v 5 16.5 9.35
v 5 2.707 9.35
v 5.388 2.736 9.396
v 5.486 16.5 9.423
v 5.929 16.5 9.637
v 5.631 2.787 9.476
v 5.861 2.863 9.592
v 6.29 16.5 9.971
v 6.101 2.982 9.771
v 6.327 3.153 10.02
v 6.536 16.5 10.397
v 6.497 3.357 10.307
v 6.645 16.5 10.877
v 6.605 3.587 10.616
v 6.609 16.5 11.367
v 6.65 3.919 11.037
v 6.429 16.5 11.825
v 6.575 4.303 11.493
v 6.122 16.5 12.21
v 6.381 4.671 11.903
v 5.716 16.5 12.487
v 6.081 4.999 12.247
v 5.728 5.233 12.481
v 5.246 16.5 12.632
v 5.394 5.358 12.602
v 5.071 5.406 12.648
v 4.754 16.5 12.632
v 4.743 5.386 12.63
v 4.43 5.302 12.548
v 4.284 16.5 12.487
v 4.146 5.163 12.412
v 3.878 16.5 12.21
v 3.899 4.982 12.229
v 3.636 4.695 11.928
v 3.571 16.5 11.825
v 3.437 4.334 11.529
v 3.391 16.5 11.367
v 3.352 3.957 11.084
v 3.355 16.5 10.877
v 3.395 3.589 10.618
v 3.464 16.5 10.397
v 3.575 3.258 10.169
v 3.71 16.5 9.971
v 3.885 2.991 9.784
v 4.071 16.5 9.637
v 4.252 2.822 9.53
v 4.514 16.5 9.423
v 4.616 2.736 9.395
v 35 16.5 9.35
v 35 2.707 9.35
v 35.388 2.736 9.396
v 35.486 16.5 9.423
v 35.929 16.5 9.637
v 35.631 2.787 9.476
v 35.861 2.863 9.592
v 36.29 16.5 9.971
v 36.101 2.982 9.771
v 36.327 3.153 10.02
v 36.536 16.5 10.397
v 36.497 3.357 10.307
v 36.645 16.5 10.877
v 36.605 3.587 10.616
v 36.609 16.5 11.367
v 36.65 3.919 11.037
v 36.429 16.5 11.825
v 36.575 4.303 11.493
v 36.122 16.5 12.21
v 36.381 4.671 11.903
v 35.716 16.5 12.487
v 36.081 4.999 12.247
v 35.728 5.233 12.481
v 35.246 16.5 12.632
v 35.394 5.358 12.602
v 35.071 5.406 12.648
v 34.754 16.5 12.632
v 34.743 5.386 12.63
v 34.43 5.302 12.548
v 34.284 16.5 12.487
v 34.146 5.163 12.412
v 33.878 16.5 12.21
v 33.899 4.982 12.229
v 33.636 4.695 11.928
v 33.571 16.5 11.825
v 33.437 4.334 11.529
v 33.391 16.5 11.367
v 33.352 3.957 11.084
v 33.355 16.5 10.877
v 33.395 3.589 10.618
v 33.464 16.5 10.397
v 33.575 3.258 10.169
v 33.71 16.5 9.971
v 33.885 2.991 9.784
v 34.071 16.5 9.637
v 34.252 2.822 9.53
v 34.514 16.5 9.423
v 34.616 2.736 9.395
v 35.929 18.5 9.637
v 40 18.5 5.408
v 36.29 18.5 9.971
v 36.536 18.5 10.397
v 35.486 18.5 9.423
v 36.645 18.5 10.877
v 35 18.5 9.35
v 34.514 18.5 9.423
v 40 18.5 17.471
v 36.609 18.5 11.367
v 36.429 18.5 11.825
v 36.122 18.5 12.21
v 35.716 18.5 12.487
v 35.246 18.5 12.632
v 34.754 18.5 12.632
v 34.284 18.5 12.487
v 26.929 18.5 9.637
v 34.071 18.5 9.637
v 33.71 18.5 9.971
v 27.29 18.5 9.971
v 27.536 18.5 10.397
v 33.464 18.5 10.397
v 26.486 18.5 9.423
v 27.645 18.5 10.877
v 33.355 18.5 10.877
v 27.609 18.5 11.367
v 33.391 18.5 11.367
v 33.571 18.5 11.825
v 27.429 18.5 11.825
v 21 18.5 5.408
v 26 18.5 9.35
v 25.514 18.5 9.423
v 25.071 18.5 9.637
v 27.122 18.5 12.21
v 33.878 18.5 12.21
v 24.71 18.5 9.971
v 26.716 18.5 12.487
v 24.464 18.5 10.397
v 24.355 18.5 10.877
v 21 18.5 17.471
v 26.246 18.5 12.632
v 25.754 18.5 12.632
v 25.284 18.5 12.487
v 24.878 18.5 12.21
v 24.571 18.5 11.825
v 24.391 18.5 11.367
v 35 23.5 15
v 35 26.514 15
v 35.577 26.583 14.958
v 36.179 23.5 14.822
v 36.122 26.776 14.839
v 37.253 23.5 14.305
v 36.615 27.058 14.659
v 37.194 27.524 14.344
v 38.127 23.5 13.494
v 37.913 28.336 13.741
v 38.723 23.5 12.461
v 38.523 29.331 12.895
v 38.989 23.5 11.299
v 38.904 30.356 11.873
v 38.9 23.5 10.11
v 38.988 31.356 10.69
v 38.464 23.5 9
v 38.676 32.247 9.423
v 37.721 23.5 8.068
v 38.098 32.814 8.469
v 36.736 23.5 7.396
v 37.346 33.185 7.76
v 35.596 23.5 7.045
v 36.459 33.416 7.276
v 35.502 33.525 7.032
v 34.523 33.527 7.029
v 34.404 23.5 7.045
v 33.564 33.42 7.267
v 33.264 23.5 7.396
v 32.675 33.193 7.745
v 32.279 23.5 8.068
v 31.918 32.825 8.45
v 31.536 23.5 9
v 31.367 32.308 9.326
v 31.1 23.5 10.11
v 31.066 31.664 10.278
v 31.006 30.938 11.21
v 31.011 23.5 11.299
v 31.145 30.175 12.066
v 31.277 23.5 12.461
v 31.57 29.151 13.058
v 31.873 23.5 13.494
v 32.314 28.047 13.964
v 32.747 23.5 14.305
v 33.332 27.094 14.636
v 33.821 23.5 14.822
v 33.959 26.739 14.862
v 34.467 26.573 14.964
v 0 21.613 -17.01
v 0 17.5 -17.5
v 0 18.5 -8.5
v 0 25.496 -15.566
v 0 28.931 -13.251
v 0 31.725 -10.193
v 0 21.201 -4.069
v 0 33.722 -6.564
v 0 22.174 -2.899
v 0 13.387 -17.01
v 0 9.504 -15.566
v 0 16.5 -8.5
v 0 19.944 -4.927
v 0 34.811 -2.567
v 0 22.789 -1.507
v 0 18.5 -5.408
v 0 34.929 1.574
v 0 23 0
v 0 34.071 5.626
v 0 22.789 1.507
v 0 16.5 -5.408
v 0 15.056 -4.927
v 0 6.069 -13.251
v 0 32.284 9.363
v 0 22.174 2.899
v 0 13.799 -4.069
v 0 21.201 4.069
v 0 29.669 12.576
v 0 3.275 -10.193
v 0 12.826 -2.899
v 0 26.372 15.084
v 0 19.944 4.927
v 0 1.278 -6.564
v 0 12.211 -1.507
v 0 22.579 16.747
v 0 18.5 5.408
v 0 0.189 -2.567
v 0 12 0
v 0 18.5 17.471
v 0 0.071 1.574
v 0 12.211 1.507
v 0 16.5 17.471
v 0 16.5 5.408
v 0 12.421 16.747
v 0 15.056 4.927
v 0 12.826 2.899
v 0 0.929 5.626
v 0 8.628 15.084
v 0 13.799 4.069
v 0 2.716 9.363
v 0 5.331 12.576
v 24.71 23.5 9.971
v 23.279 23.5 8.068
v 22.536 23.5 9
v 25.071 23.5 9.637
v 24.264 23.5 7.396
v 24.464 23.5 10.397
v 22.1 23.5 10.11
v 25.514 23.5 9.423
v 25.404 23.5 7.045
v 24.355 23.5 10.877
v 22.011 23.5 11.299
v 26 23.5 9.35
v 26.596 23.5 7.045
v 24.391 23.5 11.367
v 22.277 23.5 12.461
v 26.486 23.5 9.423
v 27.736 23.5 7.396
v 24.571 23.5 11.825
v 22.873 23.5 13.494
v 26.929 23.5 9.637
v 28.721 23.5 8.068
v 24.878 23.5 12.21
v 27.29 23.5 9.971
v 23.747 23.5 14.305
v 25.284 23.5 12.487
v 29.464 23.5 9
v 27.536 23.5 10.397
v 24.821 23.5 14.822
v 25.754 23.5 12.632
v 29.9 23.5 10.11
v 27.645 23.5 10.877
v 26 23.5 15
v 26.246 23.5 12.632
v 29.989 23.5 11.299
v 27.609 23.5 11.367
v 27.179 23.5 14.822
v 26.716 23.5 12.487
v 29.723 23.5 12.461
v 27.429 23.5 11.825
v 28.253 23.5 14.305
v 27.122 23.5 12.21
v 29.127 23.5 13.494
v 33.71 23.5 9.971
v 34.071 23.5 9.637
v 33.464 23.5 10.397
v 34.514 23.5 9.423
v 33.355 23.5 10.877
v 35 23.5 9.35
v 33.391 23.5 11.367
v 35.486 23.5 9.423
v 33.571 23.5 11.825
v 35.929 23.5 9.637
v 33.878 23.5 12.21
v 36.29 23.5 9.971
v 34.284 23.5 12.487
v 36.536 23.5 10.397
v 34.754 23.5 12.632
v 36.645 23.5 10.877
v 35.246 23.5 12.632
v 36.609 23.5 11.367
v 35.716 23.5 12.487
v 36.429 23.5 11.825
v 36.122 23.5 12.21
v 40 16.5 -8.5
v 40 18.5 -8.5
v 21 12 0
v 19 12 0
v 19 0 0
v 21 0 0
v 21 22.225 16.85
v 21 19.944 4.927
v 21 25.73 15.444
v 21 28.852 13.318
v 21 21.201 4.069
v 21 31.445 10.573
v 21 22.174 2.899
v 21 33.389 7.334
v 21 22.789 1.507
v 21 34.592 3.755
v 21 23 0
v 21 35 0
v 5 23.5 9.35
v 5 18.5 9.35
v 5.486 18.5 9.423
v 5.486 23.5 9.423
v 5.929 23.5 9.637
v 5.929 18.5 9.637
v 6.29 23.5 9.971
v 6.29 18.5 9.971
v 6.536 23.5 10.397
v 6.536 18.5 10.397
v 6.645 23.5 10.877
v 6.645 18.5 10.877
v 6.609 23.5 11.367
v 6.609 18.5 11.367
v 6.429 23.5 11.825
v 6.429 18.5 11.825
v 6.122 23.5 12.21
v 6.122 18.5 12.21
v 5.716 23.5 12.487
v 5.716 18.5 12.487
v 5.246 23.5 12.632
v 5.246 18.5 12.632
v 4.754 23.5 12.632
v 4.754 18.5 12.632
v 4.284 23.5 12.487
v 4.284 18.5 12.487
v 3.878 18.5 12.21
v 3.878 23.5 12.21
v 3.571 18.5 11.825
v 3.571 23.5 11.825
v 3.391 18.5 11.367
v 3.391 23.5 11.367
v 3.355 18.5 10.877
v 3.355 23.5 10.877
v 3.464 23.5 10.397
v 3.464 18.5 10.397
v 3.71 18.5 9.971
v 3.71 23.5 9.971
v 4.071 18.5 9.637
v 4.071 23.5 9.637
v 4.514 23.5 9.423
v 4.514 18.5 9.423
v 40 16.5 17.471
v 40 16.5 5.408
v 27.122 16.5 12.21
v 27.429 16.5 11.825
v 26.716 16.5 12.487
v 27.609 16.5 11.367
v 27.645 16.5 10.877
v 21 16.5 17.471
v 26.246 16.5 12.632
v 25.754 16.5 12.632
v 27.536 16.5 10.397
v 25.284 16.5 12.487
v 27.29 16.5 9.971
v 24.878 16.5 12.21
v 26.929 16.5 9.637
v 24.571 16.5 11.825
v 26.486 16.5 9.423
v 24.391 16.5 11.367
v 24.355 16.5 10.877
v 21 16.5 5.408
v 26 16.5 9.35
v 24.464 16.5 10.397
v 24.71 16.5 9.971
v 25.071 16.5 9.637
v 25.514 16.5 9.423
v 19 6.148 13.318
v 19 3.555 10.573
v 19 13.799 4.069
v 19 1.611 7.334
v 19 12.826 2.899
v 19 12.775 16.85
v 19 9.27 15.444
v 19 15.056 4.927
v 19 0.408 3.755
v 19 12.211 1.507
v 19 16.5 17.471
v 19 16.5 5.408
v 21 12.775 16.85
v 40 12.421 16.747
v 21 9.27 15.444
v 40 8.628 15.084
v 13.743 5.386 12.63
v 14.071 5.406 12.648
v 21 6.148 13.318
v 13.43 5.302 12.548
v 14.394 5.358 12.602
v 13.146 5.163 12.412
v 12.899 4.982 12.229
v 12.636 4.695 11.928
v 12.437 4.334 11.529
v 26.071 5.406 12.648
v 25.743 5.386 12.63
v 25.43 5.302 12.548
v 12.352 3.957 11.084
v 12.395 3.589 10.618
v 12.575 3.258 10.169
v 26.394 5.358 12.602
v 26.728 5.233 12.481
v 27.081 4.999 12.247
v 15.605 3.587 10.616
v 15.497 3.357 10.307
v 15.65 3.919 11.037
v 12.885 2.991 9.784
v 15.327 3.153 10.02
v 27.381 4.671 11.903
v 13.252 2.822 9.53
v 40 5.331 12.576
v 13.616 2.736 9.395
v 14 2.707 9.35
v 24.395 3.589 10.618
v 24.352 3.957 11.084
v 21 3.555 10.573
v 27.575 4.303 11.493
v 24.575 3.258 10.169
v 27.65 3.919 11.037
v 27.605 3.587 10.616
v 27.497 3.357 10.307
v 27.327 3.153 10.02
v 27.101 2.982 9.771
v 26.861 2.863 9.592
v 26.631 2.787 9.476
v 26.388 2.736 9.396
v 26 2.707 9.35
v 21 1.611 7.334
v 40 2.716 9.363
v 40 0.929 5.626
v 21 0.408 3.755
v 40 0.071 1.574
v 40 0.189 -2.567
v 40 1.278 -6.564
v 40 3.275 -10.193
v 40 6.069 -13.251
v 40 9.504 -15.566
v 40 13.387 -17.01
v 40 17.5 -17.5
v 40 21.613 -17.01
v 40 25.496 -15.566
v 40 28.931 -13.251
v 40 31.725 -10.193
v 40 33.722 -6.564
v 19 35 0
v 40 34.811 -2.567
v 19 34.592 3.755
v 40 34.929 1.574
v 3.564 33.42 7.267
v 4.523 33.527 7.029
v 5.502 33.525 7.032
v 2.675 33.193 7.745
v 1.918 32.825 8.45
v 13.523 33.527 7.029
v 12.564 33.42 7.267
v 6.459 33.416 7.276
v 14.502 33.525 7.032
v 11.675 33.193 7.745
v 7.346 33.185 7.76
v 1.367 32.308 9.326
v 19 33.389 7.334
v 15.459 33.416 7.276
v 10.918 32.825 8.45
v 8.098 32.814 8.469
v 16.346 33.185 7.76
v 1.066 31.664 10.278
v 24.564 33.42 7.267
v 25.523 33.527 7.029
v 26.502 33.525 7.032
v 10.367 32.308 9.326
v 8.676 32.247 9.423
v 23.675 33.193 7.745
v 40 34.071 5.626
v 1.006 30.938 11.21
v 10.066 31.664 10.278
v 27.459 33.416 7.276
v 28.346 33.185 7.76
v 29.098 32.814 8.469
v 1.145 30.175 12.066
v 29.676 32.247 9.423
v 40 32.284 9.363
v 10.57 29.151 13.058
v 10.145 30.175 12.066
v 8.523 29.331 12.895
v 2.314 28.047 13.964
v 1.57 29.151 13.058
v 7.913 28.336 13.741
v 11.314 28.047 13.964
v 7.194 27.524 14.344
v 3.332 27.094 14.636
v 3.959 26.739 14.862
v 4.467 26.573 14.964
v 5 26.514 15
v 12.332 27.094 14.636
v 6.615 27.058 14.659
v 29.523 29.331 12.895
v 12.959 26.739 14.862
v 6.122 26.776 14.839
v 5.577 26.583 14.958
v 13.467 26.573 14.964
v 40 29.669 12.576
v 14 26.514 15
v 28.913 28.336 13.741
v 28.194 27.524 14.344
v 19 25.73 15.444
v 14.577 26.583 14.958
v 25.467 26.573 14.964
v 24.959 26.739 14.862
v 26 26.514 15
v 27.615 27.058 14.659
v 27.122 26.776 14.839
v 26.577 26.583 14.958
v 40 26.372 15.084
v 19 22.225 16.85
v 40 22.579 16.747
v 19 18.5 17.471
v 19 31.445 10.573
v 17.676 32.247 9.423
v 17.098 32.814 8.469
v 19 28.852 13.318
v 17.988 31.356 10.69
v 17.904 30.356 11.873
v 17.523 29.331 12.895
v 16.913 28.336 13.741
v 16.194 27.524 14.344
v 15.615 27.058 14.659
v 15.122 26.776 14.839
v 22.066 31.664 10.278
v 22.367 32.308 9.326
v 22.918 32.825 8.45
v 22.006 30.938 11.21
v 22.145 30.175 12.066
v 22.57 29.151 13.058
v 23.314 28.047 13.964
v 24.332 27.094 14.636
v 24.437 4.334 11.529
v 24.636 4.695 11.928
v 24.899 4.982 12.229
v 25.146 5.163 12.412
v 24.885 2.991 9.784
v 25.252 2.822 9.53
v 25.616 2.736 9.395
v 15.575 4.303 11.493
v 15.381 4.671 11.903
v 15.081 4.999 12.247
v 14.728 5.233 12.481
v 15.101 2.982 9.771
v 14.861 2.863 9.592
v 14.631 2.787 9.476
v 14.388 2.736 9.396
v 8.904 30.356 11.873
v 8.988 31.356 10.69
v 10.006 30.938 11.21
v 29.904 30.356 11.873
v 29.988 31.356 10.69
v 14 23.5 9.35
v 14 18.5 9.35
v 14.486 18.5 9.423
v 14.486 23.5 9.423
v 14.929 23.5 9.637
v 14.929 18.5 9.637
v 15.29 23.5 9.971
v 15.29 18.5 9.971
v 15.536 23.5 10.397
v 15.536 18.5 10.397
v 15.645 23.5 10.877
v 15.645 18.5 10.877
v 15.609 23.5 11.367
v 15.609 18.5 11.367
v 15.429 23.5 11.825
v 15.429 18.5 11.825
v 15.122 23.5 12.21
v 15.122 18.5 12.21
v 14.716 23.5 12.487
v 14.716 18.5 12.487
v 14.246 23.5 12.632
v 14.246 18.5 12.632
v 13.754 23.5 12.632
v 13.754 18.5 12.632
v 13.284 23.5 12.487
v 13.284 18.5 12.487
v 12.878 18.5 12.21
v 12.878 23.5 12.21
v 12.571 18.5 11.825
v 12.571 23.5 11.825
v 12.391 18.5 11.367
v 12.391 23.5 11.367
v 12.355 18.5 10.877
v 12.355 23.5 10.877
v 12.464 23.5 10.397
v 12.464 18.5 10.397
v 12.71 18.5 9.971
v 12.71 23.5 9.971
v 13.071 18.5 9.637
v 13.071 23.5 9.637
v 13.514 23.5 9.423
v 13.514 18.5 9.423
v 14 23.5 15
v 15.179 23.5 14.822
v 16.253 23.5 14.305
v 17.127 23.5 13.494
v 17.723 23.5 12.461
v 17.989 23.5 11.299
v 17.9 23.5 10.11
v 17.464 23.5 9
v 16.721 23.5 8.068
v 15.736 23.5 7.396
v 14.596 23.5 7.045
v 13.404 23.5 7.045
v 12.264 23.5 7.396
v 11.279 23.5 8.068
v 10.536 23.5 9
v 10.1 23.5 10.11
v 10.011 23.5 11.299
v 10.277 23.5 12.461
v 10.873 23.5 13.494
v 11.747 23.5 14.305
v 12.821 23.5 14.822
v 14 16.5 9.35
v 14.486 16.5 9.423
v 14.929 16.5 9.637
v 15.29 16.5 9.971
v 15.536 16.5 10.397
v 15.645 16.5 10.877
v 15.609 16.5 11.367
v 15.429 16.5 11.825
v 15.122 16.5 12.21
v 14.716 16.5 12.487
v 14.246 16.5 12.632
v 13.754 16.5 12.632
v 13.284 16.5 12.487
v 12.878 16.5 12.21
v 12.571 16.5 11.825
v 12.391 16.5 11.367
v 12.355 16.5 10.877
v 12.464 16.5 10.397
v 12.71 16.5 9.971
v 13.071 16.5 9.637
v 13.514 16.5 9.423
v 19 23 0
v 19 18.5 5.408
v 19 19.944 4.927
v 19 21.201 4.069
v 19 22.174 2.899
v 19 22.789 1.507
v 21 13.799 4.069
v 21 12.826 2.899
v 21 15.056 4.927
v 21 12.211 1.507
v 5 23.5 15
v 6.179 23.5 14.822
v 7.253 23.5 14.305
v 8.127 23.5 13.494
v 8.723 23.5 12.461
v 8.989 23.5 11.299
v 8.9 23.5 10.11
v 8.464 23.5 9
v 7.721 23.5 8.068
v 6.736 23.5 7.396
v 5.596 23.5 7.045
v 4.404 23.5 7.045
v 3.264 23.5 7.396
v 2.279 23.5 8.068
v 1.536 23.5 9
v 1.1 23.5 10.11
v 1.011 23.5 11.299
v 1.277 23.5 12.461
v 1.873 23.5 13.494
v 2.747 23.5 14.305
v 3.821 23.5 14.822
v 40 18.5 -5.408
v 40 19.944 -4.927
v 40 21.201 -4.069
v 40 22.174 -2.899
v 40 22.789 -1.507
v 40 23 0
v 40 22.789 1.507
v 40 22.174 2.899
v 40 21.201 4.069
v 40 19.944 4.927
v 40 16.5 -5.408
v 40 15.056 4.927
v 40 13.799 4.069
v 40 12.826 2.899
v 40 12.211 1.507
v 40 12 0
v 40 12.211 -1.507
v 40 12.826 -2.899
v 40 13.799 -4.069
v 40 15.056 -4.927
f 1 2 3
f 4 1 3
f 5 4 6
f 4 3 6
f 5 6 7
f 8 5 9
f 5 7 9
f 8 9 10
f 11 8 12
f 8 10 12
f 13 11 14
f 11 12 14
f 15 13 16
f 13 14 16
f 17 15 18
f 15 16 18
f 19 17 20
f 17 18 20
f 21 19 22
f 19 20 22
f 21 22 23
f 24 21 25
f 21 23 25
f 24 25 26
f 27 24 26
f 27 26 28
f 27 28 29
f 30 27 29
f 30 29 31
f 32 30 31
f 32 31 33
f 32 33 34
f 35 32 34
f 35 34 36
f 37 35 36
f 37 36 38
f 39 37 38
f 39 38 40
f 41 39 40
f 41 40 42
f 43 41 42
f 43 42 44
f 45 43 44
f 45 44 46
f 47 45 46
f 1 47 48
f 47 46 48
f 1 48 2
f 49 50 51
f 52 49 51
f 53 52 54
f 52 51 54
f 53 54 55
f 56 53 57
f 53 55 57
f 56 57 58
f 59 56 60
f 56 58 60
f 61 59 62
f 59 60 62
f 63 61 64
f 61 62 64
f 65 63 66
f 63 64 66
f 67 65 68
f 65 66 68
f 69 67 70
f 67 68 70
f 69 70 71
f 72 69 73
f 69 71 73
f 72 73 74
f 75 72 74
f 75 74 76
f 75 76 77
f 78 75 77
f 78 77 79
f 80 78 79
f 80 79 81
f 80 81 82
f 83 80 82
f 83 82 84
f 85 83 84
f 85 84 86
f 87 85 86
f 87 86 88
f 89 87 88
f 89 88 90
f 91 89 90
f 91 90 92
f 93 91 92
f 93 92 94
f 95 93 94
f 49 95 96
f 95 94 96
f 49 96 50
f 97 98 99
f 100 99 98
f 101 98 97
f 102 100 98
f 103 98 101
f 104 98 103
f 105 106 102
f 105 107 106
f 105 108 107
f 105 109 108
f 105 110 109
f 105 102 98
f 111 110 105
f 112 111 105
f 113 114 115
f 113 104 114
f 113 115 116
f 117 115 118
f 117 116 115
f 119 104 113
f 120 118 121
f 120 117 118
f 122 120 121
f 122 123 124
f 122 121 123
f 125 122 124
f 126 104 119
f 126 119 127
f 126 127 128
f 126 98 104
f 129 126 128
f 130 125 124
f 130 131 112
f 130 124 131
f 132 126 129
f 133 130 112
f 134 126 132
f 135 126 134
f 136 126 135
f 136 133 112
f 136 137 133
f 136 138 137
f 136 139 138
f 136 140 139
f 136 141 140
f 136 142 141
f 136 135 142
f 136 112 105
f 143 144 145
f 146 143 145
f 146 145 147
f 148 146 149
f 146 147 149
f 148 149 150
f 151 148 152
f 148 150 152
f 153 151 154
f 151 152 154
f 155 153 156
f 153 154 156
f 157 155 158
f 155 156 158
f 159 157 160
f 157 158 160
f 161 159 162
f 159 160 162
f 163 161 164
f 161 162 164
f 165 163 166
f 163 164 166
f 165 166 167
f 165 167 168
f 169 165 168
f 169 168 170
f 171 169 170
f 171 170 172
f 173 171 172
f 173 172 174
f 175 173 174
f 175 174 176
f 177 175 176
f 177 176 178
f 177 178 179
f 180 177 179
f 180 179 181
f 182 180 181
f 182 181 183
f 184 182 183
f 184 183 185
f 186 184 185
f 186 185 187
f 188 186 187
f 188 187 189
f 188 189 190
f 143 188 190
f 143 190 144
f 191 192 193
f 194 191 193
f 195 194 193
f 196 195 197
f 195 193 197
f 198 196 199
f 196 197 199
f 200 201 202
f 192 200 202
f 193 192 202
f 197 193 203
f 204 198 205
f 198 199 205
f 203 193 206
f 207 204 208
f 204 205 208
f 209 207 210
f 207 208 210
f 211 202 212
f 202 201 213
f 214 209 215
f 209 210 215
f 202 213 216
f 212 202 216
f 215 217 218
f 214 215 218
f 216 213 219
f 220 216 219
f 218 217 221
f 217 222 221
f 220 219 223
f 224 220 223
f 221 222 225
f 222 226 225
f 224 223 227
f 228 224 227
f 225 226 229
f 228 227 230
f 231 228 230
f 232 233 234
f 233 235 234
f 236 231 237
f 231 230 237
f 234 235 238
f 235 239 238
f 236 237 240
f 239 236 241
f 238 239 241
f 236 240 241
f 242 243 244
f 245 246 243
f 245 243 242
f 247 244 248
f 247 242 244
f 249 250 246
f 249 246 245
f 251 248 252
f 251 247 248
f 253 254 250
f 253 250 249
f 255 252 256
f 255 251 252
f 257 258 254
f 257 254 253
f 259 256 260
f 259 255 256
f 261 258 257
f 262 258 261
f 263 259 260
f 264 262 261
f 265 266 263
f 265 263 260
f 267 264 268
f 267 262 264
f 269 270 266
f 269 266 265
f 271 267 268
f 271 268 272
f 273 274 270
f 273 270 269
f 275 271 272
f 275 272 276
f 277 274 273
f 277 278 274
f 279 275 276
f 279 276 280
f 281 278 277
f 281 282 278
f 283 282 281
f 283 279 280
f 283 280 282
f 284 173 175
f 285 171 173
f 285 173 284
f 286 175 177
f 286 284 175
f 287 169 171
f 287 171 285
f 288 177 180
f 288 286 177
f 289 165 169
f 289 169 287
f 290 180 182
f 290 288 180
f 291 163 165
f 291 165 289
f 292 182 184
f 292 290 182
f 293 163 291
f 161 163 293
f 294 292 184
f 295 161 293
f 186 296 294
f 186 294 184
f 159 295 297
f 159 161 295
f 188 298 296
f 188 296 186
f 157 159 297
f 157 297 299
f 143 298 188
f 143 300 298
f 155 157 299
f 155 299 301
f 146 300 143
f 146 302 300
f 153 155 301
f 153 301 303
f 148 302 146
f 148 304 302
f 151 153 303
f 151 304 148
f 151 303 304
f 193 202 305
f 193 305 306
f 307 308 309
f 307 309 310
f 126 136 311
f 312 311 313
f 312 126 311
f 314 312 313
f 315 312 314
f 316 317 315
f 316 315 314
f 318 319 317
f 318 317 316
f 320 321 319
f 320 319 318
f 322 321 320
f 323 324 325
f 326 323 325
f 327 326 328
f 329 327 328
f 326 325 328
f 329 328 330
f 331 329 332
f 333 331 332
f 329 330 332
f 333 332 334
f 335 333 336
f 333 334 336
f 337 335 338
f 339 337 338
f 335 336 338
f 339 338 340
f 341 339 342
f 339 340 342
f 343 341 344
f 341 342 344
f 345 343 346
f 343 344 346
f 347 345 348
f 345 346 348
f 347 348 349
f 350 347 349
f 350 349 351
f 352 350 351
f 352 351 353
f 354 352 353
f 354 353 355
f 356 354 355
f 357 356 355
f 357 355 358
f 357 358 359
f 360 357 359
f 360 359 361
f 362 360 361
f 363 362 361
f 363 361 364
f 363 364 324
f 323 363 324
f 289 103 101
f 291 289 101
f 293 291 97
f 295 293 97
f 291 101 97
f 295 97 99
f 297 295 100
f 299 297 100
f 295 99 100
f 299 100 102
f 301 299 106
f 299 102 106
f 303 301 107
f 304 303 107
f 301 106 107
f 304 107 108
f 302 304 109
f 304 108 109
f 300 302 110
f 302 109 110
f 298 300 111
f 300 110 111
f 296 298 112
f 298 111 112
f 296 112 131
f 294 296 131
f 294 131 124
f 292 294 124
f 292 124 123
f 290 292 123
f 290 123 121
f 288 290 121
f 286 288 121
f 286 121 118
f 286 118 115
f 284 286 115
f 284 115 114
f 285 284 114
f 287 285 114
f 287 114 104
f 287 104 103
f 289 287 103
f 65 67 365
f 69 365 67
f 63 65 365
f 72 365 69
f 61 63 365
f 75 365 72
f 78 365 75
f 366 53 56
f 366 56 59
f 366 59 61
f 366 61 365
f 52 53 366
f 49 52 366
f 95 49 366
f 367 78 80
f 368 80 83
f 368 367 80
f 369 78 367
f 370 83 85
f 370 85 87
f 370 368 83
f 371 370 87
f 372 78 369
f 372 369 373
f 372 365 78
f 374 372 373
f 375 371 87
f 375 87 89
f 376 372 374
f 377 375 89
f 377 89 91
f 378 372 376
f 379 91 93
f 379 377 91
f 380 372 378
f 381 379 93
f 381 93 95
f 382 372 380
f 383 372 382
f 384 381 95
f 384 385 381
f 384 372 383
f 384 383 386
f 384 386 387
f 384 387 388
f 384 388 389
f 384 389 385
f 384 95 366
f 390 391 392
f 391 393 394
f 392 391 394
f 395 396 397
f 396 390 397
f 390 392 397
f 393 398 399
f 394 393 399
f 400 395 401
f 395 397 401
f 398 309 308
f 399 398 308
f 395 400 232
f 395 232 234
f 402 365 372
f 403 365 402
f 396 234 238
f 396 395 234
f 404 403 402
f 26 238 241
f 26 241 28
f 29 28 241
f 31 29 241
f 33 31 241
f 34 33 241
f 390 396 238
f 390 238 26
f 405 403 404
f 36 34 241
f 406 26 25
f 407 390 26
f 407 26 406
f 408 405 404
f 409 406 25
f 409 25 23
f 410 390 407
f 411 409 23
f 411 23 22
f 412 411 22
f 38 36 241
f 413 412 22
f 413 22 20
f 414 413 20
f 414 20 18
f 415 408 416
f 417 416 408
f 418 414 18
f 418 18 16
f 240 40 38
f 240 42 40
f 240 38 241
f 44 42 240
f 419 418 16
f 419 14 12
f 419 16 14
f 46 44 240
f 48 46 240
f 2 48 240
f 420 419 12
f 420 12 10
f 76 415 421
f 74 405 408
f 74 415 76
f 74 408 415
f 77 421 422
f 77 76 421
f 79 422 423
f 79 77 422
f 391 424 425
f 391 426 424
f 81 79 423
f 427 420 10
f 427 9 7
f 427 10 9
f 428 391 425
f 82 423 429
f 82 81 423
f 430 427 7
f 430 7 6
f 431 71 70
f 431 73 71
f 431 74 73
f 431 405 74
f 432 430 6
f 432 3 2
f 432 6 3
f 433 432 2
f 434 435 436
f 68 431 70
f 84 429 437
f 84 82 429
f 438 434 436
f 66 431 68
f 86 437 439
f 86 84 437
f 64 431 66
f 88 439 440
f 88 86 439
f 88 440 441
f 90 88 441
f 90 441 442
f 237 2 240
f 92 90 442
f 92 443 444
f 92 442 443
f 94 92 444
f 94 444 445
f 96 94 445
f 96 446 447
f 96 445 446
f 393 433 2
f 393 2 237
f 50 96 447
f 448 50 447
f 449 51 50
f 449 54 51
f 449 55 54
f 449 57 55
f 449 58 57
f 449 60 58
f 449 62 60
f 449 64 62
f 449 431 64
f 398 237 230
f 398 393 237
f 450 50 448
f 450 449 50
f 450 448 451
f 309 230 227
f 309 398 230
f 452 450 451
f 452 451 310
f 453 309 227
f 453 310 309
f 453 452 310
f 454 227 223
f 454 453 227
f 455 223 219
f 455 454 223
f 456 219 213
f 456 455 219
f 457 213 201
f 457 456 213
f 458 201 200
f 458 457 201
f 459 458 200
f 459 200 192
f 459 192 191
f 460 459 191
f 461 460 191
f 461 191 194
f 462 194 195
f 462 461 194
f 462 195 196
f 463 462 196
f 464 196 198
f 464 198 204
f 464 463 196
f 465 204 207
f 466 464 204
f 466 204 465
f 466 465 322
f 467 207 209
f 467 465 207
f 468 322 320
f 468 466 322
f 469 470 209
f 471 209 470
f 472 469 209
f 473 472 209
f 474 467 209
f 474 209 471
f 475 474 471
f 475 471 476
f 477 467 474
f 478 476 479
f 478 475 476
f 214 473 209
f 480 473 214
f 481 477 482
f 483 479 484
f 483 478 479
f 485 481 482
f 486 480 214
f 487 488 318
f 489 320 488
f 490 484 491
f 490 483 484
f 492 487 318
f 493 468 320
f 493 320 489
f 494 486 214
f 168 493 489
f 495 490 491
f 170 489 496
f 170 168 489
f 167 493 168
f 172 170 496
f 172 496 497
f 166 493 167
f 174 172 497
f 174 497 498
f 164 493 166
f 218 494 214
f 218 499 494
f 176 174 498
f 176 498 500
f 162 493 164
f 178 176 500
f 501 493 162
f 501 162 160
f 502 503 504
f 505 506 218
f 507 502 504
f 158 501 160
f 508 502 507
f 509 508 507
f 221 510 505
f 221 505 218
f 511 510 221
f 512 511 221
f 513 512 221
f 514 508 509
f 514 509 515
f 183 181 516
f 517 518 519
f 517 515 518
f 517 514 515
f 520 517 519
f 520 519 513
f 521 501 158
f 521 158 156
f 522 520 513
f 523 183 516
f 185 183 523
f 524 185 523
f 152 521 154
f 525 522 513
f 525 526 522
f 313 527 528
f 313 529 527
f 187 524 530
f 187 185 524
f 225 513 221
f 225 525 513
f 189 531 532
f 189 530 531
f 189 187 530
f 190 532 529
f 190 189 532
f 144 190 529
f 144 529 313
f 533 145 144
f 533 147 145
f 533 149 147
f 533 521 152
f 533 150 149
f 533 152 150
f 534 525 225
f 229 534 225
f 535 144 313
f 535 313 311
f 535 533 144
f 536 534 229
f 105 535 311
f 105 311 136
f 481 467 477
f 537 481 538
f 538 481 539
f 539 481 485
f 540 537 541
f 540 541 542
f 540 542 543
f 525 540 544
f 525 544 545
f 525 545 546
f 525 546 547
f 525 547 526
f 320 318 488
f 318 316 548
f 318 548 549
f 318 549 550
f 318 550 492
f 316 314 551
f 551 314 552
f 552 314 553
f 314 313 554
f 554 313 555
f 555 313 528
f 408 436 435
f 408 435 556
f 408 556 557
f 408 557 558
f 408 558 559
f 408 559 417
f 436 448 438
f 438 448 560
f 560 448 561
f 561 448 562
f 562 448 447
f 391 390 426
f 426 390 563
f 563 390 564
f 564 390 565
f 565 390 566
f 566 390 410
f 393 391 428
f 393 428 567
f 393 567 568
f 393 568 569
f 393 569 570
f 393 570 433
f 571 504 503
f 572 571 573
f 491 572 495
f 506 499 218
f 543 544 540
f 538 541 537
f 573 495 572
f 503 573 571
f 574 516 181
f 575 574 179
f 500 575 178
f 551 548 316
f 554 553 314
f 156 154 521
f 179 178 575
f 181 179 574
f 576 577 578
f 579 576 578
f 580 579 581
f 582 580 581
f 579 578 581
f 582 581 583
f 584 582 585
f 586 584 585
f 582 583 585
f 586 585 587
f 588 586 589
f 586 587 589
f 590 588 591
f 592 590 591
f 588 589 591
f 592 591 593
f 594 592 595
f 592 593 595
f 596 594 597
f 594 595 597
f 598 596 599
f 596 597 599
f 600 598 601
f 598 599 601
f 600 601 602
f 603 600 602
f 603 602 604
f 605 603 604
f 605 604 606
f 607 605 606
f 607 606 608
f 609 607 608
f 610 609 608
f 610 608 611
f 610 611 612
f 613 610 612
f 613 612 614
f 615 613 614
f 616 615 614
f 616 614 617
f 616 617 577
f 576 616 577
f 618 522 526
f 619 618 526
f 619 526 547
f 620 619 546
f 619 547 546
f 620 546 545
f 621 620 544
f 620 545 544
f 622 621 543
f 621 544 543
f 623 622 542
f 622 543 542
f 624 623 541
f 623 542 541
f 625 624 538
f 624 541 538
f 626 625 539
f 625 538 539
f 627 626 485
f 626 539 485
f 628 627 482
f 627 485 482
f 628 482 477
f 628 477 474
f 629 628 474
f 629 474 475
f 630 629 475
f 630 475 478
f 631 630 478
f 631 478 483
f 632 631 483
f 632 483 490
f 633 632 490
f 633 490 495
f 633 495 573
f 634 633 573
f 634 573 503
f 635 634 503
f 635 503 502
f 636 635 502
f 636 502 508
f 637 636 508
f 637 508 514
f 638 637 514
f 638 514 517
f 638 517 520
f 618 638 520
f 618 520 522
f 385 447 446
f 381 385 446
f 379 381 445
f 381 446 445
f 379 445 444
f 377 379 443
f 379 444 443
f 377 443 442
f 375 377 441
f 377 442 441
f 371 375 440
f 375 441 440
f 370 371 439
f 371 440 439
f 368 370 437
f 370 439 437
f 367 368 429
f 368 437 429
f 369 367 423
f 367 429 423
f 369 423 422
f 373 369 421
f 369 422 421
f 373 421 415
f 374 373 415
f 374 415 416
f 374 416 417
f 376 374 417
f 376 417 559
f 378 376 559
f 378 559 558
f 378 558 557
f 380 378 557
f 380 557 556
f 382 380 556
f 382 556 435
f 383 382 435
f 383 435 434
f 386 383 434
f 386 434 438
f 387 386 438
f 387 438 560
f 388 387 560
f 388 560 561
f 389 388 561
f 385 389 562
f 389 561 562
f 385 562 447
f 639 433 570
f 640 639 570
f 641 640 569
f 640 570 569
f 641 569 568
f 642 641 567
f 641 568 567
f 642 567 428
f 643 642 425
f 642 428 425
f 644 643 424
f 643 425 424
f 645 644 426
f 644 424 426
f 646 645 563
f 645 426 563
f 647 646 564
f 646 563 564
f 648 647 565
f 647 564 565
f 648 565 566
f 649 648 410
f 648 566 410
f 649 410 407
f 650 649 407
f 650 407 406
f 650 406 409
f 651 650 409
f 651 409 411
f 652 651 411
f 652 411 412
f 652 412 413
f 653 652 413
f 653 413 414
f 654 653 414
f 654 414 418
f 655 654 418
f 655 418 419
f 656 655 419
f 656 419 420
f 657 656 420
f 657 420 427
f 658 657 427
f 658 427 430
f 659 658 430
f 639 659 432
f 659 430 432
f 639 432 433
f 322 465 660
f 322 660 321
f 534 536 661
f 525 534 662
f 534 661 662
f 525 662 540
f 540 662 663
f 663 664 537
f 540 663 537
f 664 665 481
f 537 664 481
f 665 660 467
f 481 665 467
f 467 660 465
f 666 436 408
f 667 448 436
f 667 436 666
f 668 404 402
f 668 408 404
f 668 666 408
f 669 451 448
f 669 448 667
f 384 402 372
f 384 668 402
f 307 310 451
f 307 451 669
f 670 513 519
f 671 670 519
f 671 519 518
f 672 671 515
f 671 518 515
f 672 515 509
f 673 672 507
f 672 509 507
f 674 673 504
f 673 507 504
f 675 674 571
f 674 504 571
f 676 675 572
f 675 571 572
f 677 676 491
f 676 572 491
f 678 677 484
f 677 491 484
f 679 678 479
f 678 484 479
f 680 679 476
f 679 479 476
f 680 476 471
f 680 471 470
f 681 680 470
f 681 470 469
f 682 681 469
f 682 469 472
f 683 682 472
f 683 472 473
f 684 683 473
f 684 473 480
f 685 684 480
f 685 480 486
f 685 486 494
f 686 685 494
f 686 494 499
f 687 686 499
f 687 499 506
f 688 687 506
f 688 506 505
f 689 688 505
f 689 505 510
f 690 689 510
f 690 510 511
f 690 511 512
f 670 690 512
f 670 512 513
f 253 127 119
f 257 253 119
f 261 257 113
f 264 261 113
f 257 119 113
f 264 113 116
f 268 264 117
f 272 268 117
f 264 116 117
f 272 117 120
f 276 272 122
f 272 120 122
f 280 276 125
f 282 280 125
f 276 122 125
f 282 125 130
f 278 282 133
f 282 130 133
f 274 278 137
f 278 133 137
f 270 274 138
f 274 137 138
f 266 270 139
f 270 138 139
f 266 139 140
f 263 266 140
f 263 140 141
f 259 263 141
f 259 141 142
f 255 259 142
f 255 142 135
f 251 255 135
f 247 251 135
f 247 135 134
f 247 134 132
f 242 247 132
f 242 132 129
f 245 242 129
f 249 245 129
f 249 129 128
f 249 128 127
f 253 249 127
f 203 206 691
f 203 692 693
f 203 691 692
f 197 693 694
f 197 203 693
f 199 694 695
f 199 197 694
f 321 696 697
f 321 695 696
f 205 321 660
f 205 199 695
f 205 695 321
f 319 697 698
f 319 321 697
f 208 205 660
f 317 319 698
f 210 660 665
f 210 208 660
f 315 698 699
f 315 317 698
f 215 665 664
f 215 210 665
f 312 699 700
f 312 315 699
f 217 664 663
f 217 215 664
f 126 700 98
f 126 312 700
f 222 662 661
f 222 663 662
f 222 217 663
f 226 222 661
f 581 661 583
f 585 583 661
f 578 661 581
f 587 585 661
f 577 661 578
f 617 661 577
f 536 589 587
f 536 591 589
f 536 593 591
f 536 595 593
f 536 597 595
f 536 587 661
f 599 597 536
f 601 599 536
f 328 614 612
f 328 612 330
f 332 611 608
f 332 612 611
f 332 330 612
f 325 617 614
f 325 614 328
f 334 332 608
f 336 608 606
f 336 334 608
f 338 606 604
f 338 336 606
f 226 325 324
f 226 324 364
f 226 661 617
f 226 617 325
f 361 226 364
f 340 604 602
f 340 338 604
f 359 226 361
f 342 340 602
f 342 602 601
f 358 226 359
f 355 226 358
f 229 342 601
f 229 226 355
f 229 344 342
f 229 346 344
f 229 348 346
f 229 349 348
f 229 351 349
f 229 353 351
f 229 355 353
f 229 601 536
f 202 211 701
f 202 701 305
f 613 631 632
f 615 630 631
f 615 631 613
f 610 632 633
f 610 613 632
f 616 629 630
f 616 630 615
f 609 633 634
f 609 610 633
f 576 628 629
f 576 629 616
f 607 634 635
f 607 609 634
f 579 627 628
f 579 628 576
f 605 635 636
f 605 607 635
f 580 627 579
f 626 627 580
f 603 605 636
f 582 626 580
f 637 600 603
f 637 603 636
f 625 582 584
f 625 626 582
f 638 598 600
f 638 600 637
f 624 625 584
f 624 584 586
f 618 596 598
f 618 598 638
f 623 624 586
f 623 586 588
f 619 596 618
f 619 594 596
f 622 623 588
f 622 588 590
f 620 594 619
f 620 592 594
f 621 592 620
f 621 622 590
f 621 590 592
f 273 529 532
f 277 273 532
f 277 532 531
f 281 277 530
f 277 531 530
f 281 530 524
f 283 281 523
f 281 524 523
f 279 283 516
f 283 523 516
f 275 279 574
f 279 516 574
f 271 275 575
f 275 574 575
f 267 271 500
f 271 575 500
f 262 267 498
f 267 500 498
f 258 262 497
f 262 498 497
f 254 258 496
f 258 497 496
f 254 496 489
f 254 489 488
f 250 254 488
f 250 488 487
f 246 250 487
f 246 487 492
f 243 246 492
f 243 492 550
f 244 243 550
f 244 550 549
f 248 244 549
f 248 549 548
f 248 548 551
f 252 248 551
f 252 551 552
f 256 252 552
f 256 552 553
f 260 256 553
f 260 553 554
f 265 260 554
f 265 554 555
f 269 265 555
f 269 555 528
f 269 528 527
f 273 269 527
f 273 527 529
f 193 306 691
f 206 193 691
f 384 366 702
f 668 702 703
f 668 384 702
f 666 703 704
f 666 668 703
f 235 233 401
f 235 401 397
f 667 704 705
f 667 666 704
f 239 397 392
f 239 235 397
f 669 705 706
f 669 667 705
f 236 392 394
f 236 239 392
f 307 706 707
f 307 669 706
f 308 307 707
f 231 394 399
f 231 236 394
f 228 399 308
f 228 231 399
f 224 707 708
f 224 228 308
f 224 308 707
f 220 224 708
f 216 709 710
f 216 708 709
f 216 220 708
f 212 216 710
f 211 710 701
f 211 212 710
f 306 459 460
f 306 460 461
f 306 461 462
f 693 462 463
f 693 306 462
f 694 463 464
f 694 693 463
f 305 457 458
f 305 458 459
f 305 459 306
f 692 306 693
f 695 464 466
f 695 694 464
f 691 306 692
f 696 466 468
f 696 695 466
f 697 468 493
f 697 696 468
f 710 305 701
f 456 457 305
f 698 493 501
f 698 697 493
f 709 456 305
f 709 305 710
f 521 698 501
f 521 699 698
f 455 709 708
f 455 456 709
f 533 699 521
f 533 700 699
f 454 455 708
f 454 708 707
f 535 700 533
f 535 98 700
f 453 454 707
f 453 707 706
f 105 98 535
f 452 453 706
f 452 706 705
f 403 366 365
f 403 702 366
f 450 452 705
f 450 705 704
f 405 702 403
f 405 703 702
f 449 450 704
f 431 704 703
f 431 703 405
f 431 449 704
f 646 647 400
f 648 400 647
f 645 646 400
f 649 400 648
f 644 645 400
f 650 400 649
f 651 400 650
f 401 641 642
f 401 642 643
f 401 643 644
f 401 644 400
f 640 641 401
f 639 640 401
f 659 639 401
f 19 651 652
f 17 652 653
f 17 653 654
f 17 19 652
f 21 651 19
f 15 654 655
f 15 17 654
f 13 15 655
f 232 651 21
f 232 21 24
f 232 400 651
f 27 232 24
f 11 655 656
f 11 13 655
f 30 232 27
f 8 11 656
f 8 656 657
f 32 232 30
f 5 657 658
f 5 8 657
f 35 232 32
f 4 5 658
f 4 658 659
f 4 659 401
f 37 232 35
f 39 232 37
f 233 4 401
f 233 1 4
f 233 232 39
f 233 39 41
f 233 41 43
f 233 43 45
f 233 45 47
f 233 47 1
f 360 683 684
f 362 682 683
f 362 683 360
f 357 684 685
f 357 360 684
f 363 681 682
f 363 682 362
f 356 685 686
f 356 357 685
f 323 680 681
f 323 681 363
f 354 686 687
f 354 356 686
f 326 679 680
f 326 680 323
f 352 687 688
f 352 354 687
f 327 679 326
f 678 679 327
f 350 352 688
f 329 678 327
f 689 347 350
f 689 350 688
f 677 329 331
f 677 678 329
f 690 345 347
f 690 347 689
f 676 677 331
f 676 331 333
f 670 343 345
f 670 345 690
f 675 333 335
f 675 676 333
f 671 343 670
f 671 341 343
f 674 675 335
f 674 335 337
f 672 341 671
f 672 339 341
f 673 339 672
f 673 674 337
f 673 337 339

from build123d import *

# Parameters (mm, degrees)
SKIZZE2_W                       = 40
SKIZZE2_H                       = 17.5
SCHNITT_LINEAR_AUSTRAGEN1_DEPTH = 56.957573214
SKIZZE6_W                       = 2
SKIZZE6_H                       = 16.5
SCHNITT_LINEAR_AUSTRAGEN3_DEPTH = 56.957573214
SKIZZE10_R                      = 4
SCHNITT_LINEAR_AUSTRAGEN4_DEPTH = 11.5
KERNLOCH_F_R_M4_GEWINDE1_D      = 3.3


with BuildPart() as part:
    # Skizze2 → Rotation1 (revolve)
    with BuildSketch(Plane.XY, mode=Mode.PRIVATE) as rotation1_sk:
        with Locations((20, 8.75)):
            Rectangle(SKIZZE2_W, SKIZZE2_H)
    revolve(rotation1_sk.sketch.rotate(Axis((0, 17.5, 0), (1, 0, 0)), 270), axis=Axis((0, 17.5, 0), (1, 0, 0)))

    # Skizze3 → Schnitt-Linear austragen1 (cut, through all)
    with BuildSketch(Plane.ZY):
        with BuildLine():
            Line((5.408326913, 18.5), (19.826246022, 18.5))
            Line((19.826246022, 18.5), (19.826246022, 16.5))
            Line((19.826246022, 16.5), (5.408326913, 16.5))
            ThreePointArc((5.408326913, 16.5), (0, 12), (-5.408326913, 16.5))
            Line((-5.408326913, 16.5), (-8.5, 16.5))
            Line((-8.5, 16.5), (-8.5, 17.5))
            Line((-8.5, 17.5), (-8.5, 18.5))
            Line((-8.5, 18.5), (-5.408326913, 18.5))
            ThreePointArc((-5.408326913, 18.5), (0, 23), (5.408326913, 18.5))
        make_face()
    extrude(amount=-SCHNITT_LINEAR_AUSTRAGEN1_DEPTH, mode=Mode.SUBTRACT)

    # Skizze6 → Schnitt-Linear austragen3 (cut, through all)
    with BuildSketch(Plane.XY):
        with Locations((20, 8.25)):
            Rectangle(SKIZZE6_W, SKIZZE6_H)
        with Locations((20, 26.75)):
            Rectangle(SKIZZE6_W, SKIZZE6_H)
    extrude(amount=SCHNITT_LINEAR_AUSTRAGEN3_DEPTH, mode=Mode.SUBTRACT)

    # Skizze10 → Schnitt-Linear austragen4 (cut)
    with BuildSketch(Plane(origin=(0, 35, 0), x_dir=(1, 0, 0), z_dir=(0, 1, 0))):
        with Locations(Location((26, -11, 0), (0, 0, 270))):
            Circle(SKIZZE10_R)
        with Locations(Location((35, -11, 0), (0, 0, 270))):
            Circle(SKIZZE10_R)
        with Locations(Location((5, -11, 0), (0, 0, 270))):
            Circle(SKIZZE10_R)
        with Locations(Location((14, -11, 0), (0, 0, 270))):
            Circle(SKIZZE10_R)
    extrude(amount=-SCHNITT_LINEAR_AUSTRAGEN4_DEPTH, mode=Mode.SUBTRACT)

    # Kernloch für M4 Gewinde1 (through all)
    with Locations(Plane(origin=(5, 23.5, 11), x_dir=(0, 0, 1), z_dir=(0, 1, 0))):
        with Locations((0, 0), (0, 9), (0, 21), (0, 30)):
            Hole(KERNLOCH_F_R_M4_GEWINDE1_D / 2)


solid = part.part
